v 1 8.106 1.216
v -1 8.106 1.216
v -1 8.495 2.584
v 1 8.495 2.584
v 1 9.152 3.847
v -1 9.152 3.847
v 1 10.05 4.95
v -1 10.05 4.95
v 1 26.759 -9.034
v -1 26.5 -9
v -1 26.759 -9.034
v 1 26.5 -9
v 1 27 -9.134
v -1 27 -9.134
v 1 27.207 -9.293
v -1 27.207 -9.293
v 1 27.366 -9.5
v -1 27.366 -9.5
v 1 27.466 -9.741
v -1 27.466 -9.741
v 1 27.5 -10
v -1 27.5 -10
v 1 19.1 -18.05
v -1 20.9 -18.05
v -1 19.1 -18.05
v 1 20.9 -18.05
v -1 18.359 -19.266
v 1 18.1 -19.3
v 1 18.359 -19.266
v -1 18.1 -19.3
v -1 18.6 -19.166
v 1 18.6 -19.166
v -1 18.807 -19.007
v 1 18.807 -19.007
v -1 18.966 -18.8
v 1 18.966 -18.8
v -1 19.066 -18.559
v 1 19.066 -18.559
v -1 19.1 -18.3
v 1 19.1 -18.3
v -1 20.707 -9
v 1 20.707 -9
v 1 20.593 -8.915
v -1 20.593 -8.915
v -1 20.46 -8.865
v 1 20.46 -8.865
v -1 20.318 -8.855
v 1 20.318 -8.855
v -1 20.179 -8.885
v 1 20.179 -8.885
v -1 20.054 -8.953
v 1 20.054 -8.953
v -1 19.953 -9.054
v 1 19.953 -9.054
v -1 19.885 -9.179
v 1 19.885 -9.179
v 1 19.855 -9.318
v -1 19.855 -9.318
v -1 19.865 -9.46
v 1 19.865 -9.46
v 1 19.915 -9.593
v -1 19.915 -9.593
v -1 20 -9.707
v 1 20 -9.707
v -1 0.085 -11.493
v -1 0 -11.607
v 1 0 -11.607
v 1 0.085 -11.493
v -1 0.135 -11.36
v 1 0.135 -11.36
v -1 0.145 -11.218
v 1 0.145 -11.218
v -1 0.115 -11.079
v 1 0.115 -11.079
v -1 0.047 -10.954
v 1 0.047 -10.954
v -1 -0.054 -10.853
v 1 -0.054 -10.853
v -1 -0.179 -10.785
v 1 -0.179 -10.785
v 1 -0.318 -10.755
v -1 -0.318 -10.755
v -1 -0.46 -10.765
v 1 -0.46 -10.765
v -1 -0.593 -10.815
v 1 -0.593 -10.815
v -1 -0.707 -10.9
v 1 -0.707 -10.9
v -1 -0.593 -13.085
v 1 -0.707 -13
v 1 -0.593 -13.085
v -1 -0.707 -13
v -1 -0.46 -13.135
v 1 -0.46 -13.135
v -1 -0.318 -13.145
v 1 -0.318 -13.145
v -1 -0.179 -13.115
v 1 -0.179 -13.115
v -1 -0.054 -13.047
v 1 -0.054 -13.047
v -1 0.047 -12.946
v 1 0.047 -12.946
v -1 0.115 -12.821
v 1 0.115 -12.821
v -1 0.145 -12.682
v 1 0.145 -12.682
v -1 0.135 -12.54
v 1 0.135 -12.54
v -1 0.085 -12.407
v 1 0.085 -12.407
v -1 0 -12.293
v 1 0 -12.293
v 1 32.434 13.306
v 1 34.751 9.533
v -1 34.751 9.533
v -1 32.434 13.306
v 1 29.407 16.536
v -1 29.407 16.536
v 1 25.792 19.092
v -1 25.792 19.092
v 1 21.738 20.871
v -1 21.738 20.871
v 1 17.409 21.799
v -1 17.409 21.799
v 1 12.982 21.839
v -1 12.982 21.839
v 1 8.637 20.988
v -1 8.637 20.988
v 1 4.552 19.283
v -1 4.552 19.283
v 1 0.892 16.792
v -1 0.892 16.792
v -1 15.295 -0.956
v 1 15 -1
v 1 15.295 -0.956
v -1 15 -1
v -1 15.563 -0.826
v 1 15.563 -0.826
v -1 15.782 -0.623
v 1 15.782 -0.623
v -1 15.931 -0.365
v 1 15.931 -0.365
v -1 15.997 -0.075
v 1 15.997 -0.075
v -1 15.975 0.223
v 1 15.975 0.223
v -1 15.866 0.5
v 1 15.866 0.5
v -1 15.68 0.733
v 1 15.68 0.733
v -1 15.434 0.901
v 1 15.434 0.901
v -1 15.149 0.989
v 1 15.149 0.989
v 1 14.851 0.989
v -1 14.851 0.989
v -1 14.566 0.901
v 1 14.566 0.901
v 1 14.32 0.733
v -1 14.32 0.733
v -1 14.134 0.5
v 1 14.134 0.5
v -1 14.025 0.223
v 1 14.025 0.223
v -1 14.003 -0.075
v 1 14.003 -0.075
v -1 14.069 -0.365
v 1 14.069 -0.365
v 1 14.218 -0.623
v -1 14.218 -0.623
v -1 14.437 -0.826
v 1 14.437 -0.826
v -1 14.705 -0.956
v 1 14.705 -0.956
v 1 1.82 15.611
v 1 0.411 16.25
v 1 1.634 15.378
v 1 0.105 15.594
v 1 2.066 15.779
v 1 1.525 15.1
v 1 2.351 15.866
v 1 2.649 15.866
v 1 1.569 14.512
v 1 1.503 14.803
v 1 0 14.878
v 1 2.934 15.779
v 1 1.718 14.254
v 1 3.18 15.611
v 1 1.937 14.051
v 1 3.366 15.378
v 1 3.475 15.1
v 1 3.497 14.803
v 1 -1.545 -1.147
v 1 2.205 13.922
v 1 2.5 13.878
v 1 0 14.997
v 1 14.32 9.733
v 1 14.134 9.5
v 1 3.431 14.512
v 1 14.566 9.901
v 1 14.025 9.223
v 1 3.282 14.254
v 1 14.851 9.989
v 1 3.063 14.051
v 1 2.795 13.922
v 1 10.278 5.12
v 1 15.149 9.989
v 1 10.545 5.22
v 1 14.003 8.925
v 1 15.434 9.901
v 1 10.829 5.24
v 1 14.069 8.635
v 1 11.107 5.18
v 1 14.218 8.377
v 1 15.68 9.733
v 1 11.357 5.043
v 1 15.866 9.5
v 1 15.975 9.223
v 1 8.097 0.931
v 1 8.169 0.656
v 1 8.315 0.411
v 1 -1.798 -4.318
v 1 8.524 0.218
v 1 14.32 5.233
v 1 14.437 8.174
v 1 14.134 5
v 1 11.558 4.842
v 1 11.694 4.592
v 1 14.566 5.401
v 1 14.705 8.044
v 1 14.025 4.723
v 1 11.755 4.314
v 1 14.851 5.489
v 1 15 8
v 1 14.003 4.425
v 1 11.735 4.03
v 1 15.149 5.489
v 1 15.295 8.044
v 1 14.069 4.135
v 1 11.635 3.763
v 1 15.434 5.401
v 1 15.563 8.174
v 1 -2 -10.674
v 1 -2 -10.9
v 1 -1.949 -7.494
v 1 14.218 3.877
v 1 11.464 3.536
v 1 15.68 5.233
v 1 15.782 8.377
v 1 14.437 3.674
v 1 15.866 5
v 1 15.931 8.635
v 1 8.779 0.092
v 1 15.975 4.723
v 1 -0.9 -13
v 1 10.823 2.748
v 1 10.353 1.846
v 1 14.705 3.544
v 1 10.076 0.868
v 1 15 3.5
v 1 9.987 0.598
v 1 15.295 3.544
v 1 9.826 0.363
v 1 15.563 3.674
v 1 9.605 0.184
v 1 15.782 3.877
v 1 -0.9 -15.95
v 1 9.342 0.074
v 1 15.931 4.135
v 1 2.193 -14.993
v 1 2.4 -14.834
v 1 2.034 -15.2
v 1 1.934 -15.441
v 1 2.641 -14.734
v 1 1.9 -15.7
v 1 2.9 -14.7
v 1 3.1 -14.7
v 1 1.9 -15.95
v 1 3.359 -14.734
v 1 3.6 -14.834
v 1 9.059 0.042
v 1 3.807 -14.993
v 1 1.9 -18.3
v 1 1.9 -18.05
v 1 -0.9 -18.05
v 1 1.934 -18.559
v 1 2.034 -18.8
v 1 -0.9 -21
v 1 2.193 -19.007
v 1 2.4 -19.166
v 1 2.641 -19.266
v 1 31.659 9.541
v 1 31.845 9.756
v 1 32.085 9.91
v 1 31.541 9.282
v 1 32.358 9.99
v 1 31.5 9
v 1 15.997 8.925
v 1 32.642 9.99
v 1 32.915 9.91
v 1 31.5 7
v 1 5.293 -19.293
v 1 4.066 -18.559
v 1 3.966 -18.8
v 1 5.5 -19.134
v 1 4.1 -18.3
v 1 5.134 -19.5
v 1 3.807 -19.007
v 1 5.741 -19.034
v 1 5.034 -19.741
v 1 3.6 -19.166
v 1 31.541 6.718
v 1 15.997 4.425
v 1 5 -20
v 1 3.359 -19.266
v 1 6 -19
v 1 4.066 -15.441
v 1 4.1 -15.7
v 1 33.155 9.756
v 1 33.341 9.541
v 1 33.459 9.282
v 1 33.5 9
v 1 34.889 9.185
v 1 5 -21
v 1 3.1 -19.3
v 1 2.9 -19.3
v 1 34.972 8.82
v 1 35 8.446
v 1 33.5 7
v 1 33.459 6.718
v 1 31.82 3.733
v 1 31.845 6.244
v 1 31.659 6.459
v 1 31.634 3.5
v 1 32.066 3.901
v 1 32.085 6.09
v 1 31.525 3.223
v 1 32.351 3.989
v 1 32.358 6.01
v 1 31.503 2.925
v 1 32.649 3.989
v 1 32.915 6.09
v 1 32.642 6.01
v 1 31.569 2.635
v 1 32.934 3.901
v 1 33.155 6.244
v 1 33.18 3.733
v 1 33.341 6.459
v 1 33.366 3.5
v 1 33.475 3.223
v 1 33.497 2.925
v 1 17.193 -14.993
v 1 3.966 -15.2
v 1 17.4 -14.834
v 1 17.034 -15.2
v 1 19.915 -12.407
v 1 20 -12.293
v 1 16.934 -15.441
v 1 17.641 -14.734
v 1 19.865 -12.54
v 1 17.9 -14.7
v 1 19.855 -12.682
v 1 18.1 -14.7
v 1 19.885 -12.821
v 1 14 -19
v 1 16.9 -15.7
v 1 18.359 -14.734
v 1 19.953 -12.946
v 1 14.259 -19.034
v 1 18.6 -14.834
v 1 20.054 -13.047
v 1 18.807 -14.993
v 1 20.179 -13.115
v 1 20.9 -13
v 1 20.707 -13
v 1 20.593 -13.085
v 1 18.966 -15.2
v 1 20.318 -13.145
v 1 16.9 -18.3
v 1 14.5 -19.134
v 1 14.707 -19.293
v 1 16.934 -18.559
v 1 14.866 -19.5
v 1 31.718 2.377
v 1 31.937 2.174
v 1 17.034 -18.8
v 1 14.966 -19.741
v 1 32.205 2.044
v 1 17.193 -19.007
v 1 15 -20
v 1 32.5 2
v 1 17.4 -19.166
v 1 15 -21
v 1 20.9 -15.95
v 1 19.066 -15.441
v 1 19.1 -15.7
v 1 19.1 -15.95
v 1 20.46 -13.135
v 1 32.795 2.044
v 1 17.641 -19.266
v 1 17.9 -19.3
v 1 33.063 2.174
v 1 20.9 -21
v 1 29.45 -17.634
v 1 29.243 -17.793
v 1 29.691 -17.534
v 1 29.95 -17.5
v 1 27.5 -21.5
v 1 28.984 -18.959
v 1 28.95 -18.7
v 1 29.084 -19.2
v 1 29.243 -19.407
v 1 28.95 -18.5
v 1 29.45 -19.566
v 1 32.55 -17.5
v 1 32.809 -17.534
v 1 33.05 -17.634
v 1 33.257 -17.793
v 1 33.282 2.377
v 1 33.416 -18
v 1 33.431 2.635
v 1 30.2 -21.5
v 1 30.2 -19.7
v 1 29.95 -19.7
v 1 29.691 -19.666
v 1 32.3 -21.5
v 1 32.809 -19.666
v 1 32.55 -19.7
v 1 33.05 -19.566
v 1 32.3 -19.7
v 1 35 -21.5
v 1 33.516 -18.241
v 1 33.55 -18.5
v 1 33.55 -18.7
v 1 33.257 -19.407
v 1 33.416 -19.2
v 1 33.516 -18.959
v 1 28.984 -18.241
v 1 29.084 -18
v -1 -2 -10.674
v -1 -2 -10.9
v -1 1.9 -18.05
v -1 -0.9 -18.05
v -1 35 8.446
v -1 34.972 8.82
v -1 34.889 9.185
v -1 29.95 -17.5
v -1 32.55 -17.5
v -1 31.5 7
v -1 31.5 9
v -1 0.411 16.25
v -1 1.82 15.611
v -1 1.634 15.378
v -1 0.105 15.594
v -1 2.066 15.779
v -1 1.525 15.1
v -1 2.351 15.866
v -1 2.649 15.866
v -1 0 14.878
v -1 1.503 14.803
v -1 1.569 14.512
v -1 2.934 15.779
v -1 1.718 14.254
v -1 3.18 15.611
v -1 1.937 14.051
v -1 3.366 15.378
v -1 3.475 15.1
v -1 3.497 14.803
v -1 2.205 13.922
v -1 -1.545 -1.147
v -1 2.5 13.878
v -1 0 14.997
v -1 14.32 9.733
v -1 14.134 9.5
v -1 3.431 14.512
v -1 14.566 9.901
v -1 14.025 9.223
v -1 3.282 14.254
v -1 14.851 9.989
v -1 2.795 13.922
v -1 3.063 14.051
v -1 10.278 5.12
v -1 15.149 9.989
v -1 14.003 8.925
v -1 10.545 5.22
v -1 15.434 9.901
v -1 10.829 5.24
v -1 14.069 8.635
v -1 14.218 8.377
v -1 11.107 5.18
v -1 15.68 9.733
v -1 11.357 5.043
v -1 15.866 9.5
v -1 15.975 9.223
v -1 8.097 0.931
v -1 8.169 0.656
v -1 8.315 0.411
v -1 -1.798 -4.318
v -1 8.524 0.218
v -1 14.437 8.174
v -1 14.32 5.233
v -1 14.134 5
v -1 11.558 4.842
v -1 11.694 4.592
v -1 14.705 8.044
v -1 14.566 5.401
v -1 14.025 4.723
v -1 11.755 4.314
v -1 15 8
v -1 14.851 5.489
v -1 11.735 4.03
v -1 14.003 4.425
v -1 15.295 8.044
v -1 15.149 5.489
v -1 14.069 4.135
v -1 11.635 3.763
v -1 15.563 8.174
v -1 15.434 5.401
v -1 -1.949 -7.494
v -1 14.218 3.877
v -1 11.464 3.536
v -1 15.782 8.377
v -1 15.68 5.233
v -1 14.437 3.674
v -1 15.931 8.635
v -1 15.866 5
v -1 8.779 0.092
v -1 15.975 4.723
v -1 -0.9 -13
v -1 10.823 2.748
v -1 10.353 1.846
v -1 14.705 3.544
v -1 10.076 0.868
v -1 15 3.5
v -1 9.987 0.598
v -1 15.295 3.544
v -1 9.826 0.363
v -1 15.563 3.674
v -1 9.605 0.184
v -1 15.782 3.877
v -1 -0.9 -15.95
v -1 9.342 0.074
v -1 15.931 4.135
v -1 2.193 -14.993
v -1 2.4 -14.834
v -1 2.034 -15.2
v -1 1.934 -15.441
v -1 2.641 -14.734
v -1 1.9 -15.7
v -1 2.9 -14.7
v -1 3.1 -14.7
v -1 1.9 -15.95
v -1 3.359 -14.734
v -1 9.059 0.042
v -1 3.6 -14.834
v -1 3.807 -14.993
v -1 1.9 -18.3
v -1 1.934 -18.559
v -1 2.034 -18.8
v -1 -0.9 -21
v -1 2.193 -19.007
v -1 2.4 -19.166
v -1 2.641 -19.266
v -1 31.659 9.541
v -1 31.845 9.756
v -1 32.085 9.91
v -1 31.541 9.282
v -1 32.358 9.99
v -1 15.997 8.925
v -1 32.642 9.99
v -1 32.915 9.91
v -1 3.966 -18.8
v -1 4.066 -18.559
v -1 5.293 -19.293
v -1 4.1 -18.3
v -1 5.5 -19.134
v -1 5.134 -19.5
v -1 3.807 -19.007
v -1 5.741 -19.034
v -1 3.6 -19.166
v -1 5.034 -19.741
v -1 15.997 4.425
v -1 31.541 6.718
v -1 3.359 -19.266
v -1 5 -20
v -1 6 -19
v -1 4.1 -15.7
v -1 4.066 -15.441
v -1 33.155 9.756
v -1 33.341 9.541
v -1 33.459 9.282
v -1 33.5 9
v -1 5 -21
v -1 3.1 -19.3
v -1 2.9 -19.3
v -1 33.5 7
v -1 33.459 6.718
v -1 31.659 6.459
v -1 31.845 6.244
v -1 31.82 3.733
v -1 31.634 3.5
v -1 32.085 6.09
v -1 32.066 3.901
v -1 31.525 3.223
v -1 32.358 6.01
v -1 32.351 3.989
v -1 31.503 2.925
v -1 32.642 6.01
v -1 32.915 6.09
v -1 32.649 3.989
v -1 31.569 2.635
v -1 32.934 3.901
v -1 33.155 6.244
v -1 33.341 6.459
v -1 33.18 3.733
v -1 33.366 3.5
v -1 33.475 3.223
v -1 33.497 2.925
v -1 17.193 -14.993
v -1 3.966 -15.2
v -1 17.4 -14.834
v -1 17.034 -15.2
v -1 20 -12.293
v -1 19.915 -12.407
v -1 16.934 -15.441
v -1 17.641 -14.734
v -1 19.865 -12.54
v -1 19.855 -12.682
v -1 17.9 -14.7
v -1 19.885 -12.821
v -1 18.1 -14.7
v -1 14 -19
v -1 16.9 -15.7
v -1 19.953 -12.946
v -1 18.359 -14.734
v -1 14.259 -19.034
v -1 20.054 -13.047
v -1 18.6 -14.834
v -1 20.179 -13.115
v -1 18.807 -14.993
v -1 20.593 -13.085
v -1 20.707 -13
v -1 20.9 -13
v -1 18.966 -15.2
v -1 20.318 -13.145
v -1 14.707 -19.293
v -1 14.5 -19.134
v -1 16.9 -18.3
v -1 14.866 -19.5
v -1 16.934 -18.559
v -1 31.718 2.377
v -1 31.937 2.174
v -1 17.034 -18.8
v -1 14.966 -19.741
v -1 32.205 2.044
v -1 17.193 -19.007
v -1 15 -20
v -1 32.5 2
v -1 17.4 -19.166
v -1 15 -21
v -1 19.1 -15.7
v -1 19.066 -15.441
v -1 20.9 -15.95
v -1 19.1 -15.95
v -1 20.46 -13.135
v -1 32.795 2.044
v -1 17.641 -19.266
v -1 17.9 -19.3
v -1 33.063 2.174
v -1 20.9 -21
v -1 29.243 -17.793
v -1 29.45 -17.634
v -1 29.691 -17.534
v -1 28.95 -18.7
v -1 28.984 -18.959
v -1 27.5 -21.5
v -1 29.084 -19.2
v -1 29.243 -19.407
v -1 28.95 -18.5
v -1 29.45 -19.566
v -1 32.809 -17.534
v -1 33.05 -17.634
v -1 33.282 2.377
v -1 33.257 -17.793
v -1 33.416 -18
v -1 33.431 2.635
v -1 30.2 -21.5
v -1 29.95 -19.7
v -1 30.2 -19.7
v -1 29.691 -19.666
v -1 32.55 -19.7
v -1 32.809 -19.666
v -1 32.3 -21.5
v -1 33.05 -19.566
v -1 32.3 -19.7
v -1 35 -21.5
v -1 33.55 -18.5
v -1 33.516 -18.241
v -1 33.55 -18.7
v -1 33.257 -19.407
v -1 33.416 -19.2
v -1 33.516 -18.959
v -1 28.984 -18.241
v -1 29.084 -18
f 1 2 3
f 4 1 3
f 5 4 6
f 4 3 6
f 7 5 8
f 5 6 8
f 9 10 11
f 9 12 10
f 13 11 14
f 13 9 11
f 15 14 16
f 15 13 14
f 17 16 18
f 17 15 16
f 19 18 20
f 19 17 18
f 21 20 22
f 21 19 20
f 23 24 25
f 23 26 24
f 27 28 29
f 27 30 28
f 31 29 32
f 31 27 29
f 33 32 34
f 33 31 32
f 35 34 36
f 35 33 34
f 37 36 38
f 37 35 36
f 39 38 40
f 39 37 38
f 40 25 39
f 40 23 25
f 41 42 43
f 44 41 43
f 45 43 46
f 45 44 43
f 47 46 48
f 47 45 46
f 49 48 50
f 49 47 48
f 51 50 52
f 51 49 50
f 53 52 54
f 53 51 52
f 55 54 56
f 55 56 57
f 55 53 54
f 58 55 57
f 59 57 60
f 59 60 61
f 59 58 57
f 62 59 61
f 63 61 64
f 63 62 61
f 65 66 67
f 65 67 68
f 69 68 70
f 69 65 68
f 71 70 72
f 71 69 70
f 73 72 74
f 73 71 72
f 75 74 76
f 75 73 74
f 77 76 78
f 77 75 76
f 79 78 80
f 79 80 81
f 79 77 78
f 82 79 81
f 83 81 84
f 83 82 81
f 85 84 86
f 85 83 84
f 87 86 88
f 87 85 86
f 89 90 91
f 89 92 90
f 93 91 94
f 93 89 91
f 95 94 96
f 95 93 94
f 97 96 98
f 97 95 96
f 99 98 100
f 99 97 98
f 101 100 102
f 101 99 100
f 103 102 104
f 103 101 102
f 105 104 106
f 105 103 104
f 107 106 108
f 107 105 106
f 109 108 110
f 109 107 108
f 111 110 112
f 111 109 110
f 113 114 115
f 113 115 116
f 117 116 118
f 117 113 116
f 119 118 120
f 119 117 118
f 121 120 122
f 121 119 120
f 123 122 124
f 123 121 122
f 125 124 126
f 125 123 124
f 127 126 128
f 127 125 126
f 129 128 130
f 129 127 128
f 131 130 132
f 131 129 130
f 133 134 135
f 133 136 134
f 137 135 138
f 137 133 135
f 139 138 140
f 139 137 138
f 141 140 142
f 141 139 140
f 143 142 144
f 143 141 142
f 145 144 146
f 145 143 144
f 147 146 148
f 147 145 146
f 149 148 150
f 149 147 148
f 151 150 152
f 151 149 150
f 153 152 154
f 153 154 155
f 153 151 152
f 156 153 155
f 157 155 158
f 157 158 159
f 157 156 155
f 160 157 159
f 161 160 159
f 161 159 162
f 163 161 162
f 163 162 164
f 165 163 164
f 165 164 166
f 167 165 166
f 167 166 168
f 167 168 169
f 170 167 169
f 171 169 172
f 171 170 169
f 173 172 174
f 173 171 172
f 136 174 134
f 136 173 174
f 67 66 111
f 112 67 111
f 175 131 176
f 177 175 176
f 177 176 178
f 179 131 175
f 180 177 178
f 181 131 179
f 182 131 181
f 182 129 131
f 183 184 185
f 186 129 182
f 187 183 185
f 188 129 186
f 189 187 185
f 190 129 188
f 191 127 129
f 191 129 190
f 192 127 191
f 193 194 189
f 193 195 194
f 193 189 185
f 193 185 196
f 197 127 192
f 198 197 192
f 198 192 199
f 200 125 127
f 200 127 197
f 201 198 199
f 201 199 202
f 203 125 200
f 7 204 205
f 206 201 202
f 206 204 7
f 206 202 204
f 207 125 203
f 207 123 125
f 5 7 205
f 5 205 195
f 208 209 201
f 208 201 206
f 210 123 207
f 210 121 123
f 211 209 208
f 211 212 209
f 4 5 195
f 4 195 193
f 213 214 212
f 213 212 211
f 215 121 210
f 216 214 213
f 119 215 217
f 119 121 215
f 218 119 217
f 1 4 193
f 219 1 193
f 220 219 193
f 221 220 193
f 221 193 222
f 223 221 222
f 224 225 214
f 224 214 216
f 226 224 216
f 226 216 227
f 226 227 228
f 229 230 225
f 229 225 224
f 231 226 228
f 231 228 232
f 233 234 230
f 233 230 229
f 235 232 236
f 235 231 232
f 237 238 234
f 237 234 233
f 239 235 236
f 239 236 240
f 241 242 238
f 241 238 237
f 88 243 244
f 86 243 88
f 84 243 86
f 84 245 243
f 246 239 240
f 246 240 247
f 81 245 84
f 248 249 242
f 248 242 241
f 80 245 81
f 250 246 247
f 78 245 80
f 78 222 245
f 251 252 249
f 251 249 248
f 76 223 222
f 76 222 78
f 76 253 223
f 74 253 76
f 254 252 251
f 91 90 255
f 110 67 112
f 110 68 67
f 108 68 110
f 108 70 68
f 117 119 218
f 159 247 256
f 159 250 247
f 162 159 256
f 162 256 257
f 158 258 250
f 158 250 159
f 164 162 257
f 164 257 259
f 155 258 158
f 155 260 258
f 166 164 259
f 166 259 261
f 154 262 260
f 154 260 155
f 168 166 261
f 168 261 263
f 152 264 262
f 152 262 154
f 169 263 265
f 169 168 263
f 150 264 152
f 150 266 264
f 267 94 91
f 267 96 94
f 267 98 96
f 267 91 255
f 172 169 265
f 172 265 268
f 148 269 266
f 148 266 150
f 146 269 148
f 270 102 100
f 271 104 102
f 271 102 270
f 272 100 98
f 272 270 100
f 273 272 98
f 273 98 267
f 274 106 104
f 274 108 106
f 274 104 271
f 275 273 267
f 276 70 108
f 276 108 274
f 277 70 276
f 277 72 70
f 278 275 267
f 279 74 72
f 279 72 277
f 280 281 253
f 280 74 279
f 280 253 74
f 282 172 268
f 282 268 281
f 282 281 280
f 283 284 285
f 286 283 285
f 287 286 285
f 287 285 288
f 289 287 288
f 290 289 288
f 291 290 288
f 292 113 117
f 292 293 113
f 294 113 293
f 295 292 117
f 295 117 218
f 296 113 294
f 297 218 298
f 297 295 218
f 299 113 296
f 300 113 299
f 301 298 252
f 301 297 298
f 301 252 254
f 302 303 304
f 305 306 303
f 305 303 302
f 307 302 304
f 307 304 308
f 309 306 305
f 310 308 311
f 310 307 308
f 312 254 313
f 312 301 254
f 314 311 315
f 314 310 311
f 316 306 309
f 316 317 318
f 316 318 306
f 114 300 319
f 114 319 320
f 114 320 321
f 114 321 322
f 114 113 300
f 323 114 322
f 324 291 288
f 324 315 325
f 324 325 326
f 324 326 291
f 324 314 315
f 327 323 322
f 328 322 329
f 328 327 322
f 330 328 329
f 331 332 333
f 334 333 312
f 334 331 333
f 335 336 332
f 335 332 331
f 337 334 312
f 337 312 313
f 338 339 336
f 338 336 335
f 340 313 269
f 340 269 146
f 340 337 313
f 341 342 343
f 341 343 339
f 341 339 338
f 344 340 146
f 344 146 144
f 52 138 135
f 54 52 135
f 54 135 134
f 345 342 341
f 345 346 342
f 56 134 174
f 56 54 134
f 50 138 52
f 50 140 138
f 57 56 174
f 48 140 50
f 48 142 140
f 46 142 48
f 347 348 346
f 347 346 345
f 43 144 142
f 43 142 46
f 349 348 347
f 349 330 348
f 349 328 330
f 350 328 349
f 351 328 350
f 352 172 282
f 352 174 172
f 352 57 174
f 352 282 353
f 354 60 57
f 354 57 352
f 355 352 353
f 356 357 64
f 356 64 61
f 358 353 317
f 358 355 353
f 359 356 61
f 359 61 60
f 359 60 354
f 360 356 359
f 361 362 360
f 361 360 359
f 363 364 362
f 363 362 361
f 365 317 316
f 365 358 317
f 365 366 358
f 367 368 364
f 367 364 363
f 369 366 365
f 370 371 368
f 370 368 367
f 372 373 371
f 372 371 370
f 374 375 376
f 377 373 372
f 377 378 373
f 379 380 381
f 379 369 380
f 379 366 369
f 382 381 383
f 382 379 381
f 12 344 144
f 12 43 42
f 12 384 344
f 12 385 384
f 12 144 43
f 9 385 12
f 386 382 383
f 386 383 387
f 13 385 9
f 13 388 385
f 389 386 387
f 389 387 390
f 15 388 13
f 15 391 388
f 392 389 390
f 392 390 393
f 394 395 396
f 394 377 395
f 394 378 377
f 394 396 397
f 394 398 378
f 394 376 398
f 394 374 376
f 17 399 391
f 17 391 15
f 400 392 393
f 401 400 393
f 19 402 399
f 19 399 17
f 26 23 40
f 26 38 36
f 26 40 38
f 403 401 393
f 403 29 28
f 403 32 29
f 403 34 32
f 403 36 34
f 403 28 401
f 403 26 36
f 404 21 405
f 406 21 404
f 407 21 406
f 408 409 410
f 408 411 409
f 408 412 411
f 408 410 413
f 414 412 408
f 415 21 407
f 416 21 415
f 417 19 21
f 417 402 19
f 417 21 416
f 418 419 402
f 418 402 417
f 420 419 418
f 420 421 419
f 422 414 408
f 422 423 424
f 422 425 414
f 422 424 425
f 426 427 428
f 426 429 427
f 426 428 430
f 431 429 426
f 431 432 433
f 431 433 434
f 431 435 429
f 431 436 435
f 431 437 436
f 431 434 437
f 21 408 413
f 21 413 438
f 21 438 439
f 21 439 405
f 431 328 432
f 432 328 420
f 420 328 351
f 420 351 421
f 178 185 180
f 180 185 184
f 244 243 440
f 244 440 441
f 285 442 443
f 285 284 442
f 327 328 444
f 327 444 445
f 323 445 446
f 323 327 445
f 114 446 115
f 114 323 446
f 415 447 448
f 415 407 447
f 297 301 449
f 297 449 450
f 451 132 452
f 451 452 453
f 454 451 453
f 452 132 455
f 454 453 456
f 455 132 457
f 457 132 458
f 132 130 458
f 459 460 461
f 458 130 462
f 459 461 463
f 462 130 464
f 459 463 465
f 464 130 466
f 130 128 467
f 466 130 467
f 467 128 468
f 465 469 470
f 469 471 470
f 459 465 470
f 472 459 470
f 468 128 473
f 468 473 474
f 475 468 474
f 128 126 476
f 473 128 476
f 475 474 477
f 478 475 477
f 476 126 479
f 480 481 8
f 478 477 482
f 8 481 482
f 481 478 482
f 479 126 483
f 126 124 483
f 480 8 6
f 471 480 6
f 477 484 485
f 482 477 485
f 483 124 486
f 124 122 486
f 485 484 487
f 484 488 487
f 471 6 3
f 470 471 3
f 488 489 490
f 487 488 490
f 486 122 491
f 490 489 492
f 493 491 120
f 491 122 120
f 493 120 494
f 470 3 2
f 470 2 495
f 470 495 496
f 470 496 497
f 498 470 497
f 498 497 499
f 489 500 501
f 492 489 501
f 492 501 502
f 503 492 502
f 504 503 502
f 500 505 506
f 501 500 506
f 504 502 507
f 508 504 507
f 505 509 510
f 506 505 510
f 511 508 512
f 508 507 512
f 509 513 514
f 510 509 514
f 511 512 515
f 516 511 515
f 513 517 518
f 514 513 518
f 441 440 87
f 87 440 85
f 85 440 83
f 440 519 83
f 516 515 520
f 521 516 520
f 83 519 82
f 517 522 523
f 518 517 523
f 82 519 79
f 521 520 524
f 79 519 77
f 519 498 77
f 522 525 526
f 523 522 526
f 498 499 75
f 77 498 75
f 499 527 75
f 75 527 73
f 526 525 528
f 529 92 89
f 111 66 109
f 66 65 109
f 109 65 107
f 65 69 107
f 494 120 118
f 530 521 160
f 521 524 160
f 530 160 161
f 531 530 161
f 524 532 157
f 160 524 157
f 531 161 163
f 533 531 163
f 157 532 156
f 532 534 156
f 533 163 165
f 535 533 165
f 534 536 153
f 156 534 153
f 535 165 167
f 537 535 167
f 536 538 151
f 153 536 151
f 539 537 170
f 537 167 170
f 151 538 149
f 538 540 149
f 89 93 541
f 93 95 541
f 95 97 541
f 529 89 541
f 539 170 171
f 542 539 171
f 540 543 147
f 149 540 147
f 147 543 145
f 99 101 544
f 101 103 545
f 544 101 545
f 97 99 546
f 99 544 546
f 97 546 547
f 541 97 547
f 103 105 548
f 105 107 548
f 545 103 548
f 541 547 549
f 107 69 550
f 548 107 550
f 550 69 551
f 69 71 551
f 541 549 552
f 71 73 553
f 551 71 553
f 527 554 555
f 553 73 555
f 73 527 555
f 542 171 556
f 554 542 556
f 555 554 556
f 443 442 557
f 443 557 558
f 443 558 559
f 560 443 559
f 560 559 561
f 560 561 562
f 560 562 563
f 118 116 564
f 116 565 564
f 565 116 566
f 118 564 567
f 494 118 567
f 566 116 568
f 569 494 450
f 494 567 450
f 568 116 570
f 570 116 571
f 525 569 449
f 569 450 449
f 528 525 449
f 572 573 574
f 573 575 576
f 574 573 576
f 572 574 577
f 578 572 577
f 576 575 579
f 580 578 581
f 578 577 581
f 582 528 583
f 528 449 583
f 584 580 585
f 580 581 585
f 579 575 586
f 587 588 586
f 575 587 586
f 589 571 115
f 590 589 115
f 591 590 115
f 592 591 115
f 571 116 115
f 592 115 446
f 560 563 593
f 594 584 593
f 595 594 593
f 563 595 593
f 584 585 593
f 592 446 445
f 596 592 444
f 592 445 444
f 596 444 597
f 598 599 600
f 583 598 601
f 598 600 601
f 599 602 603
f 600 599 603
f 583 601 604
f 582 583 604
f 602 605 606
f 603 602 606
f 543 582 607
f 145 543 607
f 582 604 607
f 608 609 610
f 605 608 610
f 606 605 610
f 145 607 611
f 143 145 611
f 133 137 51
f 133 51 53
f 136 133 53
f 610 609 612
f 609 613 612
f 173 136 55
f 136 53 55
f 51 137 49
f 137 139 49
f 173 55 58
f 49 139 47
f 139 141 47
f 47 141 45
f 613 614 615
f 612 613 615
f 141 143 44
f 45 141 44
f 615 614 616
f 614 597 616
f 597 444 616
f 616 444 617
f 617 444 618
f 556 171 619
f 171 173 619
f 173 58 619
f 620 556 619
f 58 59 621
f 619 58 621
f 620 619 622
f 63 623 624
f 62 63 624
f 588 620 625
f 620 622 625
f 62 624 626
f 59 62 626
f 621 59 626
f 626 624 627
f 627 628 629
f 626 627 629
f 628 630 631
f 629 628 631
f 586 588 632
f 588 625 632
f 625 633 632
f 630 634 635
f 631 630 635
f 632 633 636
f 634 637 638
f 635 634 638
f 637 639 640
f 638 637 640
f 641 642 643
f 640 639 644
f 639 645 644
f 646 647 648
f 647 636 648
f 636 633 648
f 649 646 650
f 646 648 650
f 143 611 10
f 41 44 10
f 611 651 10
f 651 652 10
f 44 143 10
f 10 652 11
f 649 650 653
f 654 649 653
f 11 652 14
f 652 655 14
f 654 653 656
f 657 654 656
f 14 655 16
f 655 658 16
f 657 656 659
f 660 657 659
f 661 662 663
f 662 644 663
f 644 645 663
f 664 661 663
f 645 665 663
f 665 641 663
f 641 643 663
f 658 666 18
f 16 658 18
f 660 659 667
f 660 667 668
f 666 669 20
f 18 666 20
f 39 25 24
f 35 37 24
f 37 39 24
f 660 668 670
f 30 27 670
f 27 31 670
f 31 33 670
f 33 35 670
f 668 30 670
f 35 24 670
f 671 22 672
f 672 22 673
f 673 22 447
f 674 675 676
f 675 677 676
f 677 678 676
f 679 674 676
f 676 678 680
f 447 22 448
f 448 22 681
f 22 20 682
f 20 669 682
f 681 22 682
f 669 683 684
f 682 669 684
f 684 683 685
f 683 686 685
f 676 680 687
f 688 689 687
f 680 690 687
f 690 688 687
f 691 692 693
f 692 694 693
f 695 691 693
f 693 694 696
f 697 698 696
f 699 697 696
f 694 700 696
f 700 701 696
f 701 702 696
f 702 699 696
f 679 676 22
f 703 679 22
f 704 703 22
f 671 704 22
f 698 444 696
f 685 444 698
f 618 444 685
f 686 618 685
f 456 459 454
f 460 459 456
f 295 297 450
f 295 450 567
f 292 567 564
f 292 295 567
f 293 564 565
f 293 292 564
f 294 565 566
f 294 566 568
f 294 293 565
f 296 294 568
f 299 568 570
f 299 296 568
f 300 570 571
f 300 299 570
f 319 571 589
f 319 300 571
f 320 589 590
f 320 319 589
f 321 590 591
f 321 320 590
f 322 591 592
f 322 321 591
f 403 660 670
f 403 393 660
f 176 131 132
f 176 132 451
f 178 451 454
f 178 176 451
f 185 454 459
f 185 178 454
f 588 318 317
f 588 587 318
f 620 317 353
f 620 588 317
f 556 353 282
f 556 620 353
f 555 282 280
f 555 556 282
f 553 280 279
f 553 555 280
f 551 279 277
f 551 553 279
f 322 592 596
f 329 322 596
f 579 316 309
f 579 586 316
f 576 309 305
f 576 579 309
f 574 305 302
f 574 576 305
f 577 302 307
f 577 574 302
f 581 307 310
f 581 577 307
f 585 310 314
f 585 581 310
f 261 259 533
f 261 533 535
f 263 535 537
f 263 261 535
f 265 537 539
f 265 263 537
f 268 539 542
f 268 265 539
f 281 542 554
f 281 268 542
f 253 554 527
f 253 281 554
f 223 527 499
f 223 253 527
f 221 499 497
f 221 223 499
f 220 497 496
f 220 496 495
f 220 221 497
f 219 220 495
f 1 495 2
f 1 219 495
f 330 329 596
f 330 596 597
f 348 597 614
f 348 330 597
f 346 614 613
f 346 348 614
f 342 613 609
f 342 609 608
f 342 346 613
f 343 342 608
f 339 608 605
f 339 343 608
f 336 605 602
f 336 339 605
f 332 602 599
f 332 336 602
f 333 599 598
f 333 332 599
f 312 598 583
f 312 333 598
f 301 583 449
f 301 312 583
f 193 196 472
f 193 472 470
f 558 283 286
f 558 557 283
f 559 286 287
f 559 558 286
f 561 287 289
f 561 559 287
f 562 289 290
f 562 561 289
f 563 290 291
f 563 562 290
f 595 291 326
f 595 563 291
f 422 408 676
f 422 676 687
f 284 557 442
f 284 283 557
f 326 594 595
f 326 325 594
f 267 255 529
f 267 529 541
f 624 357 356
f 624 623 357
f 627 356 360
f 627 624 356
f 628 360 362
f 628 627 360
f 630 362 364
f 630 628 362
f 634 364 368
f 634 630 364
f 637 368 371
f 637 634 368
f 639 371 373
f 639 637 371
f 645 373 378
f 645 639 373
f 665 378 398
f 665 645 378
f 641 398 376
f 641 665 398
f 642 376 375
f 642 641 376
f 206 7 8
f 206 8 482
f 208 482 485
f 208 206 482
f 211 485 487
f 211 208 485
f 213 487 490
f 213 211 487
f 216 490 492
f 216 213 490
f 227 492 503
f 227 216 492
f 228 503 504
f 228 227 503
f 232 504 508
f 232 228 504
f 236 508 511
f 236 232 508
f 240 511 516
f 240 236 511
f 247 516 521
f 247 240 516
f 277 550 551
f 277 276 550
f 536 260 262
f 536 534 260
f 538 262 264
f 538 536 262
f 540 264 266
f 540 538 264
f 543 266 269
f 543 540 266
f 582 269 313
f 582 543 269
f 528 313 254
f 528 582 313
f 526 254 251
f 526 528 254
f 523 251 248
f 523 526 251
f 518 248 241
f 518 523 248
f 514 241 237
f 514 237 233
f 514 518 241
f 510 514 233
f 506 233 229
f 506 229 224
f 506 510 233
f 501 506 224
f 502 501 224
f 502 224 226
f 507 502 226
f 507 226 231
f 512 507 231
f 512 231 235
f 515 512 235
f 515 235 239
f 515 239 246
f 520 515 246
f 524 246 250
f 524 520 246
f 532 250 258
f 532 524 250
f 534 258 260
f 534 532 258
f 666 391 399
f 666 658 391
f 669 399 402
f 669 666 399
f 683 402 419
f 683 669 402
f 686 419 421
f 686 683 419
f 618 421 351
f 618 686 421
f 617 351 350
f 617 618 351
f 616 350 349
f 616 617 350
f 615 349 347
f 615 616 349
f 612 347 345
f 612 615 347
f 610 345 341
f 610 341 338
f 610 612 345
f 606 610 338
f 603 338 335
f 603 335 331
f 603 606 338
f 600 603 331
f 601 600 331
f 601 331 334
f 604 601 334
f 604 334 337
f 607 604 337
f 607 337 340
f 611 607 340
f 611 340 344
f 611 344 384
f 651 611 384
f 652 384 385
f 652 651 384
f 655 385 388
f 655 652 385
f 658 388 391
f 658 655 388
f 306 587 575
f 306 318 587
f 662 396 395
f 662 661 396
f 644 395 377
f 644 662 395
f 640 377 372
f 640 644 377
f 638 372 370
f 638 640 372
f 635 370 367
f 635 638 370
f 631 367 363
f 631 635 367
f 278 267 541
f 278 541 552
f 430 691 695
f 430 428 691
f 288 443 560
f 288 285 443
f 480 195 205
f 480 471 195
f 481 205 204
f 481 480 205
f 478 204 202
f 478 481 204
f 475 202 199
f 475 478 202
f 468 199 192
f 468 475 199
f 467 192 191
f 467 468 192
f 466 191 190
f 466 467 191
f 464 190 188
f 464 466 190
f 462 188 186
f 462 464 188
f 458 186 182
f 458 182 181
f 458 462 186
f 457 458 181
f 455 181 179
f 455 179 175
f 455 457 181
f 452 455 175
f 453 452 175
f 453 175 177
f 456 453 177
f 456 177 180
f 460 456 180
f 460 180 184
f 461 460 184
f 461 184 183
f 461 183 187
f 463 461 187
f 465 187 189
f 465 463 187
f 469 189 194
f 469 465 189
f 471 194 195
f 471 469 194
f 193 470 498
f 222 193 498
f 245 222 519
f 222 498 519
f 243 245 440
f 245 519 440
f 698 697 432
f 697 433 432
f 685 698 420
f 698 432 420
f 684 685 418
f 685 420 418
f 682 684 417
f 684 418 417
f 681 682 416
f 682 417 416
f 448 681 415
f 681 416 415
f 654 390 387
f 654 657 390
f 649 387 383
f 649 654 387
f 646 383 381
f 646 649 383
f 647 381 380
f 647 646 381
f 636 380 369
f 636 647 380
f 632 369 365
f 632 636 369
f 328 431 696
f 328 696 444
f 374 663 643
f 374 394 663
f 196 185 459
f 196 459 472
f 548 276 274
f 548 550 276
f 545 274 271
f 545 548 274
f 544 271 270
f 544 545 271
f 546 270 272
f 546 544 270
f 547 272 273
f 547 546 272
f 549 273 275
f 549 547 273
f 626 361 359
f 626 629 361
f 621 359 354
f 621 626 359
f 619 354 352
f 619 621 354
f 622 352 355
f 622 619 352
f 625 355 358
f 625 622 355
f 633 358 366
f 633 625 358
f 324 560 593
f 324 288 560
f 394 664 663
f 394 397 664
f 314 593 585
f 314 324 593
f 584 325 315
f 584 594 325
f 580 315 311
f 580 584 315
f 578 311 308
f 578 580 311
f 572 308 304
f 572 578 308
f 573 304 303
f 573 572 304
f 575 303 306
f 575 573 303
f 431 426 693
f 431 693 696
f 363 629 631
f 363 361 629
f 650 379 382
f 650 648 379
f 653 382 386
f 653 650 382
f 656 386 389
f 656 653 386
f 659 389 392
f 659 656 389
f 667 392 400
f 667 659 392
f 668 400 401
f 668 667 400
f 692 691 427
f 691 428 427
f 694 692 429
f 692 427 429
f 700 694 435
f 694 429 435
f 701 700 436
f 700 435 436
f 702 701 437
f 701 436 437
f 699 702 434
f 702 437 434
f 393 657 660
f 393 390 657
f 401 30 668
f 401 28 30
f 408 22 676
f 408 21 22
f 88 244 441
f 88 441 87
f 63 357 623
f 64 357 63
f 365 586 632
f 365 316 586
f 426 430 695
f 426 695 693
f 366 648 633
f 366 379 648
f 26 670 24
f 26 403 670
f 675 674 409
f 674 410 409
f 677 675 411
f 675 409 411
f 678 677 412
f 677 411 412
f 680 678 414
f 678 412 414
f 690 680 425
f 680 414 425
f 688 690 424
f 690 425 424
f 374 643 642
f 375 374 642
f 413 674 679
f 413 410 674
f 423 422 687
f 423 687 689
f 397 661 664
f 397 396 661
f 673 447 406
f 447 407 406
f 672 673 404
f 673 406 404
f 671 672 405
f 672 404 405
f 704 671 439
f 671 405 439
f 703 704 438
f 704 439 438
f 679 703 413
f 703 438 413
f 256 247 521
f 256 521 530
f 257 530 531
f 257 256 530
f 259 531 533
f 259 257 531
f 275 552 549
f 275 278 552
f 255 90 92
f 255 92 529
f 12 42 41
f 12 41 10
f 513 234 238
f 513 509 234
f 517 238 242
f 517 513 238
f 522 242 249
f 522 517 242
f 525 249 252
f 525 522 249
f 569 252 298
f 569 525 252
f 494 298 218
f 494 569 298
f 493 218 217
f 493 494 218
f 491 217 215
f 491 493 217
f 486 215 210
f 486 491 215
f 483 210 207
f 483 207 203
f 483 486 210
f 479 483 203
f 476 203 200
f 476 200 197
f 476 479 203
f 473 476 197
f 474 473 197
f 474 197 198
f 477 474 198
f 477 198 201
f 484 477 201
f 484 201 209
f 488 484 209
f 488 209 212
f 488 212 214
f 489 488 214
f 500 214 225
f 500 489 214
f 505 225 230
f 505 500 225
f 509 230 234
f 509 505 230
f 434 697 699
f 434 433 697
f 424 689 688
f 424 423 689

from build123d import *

# Parameters (mm, degrees)
SKETCH1_R           = 1
BASE_SHAPE_DEPTH    = 1
BOTTOM_FILLET_R     = 100
MILLING_FILLETS_R   = 1
MILL_START          = -2
SKETCH17_R          = 0.5
MILL_CUTS_1MM_DEPTH = 2


with BuildPart() as part:
    # Sketch1 → Base shape (new, symmetric)
    with BuildSketch(Plane(origin=(0, 0, 0), x_dir=(0, 0, -1), z_dir=(1, 0, 0))):
        with BuildLine():
            Line((13, 20), (9, 20))
            Line((9, 20), (9, 27.5))
            Line((9, 27.5), (21.5, 27.5))
            Line((21.5, 27.5), (21.5, 30.2))
            Line((21.5, 30.2), (19.7, 30.2))
            Line((19.7, 30.2), (19.7, 28.95))
            Line((19.7, 28.95), (17.5, 28.95))
            Line((17.5, 28.95), (17.5, 33.55))
            Line((17.5, 33.55), (19.7, 33.55))
            Line((19.7, 33.55), (19.7, 32.3))
            Line((19.7, 32.3), (21.5, 32.3))
            Line((21.5, 32.3), (21.5, 35))
            Line((21.5, 35), (-8.44638615, 35))
            ThreePointArc((-8.44638615, 35), (-9.003752396, 34.937076705), (-9.533061586, 34.751474294))
            ThreePointArc((-9.533061586, 34.751474294), (-21.444501682, 19.597102087), (-16.791629001, 0.891803961))
            ThreePointArc((-16.791629001, 0.891803961), (-15.933367715, 0.233892092), (-14.877548152, 0))
            Line((-14.877548152, 0), (-14.996910346, 0))
            Line((-14.996910346, 0), (5.9, -2))
            Line((5.9, -2), (10.9, -2))
            Line((10.9, -2), (10.9, 0))
            Line((10.9, 0), (13, 0))
            Line((13, 0), (13, -0.9))
            Line((13, -0.9), (15.95, -0.9))
            Line((15.95, -0.9), (15.95, 1.9))
            Line((15.95, 1.9), (14.7, 1.9))
            Line((14.7, 1.9), (14.7, 4.1))
            Line((14.7, 4.1), (19.3, 4.1))
            Line((19.3, 4.1), (19.3, 1.9))
            Line((19.3, 1.9), (18.05, 1.9))
            Line((18.05, 1.9), (18.05, -0.9))
            Line((18.05, -0.9), (21, -0.9))
            Line((21, -0.9), (21, 5))
            Line((21, 5), (19, 5))
            Line((19, 5), (19, 15))
            Line((19, 15), (21, 15))
            Line((21, 15), (21, 20.9))
            Line((21, 20.9), (18.05, 20.9))
            Line((18.05, 20.9), (18.05, 19.1))
            Line((18.05, 19.1), (19.3, 19.1))
            Line((19.3, 19.1), (19.3, 16.9))
            Line((19.3, 16.9), (14.7, 16.9))
            Line((14.7, 16.9), (14.7, 19.1))
            Line((14.7, 19.1), (15.95, 19.1))
            Line((15.95, 19.1), (15.95, 20.9))
            Line((15.95, 20.9), (13, 20.9))
            Line((13, 20.9), (13, 20))
        make_face()
        with BuildLine():
            ThreePointArc((-0.868240859, 10.07596123), (-0.05708131, 8.91750532), (-1.215537181, 8.106345718))
            ThreePointArc((-1.215537181, 8.106345718), (-3.232240261, 8.790924151), (-4.949747462, 10.050252526))
            ThreePointArc((-4.949747462, 10.050252526), (-4.949747471, 11.464466091), (-3.535533905, 11.464466093))
            ThreePointArc((-3.535533905, 11.464466093), (-2.308743052, 10.564945827), (-0.868240859, 10.07596123))
        make_face(mode=Mode.SUBTRACT)
        with Locations((-4.5, 15)):
            Circle(SKETCH1_R, mode=Mode.SUBTRACT)
        with Locations((-9, 15)):
            Circle(SKETCH1_R, mode=Mode.SUBTRACT)
        with Locations((-3, 32.5)):
            Circle(SKETCH1_R, mode=Mode.SUBTRACT)
        with Locations((0, 15)):
            Circle(SKETCH1_R, mode=Mode.SUBTRACT)
        with Locations((-14.877548152, 2.5)):
            Circle(SKETCH1_R, mode=Mode.SUBTRACT)
        with BuildLine():
            Line((-9, 33.5), (-7, 33.5))
            ThreePointArc((-7, 33.5), (-6, 32.5), (-7, 31.5))
            Line((-7, 31.5), (-9, 31.5))
            ThreePointArc((-9, 31.5), (-10, 32.5), (-9, 33.5))
        make_face(mode=Mode.SUBTRACT)
    extrude(amount=BASE_SHAPE_DEPTH, both=True)

    # Bottom fillet
    # the kernel refuses this fillet: 100 mm, written as the material it takes off along each edge
    with BuildSketch(Plane(origin=(-12.9362194, -2, -5.9), x_dir=(0, 0, -1), z_dir=(1, 0, 0))) as bottom_fillet_piece_1:
        with BuildLine():
            CenterArc((BOTTOM_FILLET_R * 0.0477448775998, BOTTOM_FILLET_R), BOTTOM_FILLET_R, 264.532991667, 5.467008333)
            Line((-BOTTOM_FILLET_R * 0.0475276967795, BOTTOM_FILLET_R * 0.00454877740235), (0, 0))
            Line((0, 0), (BOTTOM_FILLET_R * 0.0477448775998, 0))
        make_face()
    extrude(amount=25.8724388, mode=Mode.SUBTRACT)

    # Milling fillets
    milling_fillets_edges = [part.edges().sort_by_distance(p)[0] for p in [
        (0, 33.55, -19.7),
        (0, 33.55, -17.5),
        (0, 28.95, -17.5),
        (0, 28.95, -19.7),
        (0, 27.5, -9),
        (0, 19.1, -14.7),
        (0, 16.9, -14.7),
        (0, 16.9, -19.3),
        (0, 19.1, -19.3),
        (0, 15, -19),
        (0, 5, -19),
        (0, 1.9, -19.3),
        (0, 4.1, -19.3),
        (0, 4.1, -14.7),
        (0, 1.9, -14.7),
    ]]
    fillet(milling_fillets_edges, radius=MILLING_FILLETS_R)

    # Sketch17 → Mill cuts 1mm (cut)
    with BuildSketch(Plane(origin=(1, 0, 0), x_dir=(0, 0, -1), z_dir=(1, 0, 0)).offset(MILL_START)):
        with Locations((9.353553391, 20.353553391)):
            Circle(SKETCH17_R)
        with Locations((12.646446609, 20.353553391)):
            Circle(SKETCH17_R)
        with Locations((12.646446609, -0.353553391)):
            Circle(SKETCH17_R)
        with Locations((11.253553391, -0.353553391)):
            Circle(SKETCH17_R)
    extrude(amount=MILL_CUTS_1MM_DEPTH, mode=Mode.SUBTRACT)


solid = part.part
